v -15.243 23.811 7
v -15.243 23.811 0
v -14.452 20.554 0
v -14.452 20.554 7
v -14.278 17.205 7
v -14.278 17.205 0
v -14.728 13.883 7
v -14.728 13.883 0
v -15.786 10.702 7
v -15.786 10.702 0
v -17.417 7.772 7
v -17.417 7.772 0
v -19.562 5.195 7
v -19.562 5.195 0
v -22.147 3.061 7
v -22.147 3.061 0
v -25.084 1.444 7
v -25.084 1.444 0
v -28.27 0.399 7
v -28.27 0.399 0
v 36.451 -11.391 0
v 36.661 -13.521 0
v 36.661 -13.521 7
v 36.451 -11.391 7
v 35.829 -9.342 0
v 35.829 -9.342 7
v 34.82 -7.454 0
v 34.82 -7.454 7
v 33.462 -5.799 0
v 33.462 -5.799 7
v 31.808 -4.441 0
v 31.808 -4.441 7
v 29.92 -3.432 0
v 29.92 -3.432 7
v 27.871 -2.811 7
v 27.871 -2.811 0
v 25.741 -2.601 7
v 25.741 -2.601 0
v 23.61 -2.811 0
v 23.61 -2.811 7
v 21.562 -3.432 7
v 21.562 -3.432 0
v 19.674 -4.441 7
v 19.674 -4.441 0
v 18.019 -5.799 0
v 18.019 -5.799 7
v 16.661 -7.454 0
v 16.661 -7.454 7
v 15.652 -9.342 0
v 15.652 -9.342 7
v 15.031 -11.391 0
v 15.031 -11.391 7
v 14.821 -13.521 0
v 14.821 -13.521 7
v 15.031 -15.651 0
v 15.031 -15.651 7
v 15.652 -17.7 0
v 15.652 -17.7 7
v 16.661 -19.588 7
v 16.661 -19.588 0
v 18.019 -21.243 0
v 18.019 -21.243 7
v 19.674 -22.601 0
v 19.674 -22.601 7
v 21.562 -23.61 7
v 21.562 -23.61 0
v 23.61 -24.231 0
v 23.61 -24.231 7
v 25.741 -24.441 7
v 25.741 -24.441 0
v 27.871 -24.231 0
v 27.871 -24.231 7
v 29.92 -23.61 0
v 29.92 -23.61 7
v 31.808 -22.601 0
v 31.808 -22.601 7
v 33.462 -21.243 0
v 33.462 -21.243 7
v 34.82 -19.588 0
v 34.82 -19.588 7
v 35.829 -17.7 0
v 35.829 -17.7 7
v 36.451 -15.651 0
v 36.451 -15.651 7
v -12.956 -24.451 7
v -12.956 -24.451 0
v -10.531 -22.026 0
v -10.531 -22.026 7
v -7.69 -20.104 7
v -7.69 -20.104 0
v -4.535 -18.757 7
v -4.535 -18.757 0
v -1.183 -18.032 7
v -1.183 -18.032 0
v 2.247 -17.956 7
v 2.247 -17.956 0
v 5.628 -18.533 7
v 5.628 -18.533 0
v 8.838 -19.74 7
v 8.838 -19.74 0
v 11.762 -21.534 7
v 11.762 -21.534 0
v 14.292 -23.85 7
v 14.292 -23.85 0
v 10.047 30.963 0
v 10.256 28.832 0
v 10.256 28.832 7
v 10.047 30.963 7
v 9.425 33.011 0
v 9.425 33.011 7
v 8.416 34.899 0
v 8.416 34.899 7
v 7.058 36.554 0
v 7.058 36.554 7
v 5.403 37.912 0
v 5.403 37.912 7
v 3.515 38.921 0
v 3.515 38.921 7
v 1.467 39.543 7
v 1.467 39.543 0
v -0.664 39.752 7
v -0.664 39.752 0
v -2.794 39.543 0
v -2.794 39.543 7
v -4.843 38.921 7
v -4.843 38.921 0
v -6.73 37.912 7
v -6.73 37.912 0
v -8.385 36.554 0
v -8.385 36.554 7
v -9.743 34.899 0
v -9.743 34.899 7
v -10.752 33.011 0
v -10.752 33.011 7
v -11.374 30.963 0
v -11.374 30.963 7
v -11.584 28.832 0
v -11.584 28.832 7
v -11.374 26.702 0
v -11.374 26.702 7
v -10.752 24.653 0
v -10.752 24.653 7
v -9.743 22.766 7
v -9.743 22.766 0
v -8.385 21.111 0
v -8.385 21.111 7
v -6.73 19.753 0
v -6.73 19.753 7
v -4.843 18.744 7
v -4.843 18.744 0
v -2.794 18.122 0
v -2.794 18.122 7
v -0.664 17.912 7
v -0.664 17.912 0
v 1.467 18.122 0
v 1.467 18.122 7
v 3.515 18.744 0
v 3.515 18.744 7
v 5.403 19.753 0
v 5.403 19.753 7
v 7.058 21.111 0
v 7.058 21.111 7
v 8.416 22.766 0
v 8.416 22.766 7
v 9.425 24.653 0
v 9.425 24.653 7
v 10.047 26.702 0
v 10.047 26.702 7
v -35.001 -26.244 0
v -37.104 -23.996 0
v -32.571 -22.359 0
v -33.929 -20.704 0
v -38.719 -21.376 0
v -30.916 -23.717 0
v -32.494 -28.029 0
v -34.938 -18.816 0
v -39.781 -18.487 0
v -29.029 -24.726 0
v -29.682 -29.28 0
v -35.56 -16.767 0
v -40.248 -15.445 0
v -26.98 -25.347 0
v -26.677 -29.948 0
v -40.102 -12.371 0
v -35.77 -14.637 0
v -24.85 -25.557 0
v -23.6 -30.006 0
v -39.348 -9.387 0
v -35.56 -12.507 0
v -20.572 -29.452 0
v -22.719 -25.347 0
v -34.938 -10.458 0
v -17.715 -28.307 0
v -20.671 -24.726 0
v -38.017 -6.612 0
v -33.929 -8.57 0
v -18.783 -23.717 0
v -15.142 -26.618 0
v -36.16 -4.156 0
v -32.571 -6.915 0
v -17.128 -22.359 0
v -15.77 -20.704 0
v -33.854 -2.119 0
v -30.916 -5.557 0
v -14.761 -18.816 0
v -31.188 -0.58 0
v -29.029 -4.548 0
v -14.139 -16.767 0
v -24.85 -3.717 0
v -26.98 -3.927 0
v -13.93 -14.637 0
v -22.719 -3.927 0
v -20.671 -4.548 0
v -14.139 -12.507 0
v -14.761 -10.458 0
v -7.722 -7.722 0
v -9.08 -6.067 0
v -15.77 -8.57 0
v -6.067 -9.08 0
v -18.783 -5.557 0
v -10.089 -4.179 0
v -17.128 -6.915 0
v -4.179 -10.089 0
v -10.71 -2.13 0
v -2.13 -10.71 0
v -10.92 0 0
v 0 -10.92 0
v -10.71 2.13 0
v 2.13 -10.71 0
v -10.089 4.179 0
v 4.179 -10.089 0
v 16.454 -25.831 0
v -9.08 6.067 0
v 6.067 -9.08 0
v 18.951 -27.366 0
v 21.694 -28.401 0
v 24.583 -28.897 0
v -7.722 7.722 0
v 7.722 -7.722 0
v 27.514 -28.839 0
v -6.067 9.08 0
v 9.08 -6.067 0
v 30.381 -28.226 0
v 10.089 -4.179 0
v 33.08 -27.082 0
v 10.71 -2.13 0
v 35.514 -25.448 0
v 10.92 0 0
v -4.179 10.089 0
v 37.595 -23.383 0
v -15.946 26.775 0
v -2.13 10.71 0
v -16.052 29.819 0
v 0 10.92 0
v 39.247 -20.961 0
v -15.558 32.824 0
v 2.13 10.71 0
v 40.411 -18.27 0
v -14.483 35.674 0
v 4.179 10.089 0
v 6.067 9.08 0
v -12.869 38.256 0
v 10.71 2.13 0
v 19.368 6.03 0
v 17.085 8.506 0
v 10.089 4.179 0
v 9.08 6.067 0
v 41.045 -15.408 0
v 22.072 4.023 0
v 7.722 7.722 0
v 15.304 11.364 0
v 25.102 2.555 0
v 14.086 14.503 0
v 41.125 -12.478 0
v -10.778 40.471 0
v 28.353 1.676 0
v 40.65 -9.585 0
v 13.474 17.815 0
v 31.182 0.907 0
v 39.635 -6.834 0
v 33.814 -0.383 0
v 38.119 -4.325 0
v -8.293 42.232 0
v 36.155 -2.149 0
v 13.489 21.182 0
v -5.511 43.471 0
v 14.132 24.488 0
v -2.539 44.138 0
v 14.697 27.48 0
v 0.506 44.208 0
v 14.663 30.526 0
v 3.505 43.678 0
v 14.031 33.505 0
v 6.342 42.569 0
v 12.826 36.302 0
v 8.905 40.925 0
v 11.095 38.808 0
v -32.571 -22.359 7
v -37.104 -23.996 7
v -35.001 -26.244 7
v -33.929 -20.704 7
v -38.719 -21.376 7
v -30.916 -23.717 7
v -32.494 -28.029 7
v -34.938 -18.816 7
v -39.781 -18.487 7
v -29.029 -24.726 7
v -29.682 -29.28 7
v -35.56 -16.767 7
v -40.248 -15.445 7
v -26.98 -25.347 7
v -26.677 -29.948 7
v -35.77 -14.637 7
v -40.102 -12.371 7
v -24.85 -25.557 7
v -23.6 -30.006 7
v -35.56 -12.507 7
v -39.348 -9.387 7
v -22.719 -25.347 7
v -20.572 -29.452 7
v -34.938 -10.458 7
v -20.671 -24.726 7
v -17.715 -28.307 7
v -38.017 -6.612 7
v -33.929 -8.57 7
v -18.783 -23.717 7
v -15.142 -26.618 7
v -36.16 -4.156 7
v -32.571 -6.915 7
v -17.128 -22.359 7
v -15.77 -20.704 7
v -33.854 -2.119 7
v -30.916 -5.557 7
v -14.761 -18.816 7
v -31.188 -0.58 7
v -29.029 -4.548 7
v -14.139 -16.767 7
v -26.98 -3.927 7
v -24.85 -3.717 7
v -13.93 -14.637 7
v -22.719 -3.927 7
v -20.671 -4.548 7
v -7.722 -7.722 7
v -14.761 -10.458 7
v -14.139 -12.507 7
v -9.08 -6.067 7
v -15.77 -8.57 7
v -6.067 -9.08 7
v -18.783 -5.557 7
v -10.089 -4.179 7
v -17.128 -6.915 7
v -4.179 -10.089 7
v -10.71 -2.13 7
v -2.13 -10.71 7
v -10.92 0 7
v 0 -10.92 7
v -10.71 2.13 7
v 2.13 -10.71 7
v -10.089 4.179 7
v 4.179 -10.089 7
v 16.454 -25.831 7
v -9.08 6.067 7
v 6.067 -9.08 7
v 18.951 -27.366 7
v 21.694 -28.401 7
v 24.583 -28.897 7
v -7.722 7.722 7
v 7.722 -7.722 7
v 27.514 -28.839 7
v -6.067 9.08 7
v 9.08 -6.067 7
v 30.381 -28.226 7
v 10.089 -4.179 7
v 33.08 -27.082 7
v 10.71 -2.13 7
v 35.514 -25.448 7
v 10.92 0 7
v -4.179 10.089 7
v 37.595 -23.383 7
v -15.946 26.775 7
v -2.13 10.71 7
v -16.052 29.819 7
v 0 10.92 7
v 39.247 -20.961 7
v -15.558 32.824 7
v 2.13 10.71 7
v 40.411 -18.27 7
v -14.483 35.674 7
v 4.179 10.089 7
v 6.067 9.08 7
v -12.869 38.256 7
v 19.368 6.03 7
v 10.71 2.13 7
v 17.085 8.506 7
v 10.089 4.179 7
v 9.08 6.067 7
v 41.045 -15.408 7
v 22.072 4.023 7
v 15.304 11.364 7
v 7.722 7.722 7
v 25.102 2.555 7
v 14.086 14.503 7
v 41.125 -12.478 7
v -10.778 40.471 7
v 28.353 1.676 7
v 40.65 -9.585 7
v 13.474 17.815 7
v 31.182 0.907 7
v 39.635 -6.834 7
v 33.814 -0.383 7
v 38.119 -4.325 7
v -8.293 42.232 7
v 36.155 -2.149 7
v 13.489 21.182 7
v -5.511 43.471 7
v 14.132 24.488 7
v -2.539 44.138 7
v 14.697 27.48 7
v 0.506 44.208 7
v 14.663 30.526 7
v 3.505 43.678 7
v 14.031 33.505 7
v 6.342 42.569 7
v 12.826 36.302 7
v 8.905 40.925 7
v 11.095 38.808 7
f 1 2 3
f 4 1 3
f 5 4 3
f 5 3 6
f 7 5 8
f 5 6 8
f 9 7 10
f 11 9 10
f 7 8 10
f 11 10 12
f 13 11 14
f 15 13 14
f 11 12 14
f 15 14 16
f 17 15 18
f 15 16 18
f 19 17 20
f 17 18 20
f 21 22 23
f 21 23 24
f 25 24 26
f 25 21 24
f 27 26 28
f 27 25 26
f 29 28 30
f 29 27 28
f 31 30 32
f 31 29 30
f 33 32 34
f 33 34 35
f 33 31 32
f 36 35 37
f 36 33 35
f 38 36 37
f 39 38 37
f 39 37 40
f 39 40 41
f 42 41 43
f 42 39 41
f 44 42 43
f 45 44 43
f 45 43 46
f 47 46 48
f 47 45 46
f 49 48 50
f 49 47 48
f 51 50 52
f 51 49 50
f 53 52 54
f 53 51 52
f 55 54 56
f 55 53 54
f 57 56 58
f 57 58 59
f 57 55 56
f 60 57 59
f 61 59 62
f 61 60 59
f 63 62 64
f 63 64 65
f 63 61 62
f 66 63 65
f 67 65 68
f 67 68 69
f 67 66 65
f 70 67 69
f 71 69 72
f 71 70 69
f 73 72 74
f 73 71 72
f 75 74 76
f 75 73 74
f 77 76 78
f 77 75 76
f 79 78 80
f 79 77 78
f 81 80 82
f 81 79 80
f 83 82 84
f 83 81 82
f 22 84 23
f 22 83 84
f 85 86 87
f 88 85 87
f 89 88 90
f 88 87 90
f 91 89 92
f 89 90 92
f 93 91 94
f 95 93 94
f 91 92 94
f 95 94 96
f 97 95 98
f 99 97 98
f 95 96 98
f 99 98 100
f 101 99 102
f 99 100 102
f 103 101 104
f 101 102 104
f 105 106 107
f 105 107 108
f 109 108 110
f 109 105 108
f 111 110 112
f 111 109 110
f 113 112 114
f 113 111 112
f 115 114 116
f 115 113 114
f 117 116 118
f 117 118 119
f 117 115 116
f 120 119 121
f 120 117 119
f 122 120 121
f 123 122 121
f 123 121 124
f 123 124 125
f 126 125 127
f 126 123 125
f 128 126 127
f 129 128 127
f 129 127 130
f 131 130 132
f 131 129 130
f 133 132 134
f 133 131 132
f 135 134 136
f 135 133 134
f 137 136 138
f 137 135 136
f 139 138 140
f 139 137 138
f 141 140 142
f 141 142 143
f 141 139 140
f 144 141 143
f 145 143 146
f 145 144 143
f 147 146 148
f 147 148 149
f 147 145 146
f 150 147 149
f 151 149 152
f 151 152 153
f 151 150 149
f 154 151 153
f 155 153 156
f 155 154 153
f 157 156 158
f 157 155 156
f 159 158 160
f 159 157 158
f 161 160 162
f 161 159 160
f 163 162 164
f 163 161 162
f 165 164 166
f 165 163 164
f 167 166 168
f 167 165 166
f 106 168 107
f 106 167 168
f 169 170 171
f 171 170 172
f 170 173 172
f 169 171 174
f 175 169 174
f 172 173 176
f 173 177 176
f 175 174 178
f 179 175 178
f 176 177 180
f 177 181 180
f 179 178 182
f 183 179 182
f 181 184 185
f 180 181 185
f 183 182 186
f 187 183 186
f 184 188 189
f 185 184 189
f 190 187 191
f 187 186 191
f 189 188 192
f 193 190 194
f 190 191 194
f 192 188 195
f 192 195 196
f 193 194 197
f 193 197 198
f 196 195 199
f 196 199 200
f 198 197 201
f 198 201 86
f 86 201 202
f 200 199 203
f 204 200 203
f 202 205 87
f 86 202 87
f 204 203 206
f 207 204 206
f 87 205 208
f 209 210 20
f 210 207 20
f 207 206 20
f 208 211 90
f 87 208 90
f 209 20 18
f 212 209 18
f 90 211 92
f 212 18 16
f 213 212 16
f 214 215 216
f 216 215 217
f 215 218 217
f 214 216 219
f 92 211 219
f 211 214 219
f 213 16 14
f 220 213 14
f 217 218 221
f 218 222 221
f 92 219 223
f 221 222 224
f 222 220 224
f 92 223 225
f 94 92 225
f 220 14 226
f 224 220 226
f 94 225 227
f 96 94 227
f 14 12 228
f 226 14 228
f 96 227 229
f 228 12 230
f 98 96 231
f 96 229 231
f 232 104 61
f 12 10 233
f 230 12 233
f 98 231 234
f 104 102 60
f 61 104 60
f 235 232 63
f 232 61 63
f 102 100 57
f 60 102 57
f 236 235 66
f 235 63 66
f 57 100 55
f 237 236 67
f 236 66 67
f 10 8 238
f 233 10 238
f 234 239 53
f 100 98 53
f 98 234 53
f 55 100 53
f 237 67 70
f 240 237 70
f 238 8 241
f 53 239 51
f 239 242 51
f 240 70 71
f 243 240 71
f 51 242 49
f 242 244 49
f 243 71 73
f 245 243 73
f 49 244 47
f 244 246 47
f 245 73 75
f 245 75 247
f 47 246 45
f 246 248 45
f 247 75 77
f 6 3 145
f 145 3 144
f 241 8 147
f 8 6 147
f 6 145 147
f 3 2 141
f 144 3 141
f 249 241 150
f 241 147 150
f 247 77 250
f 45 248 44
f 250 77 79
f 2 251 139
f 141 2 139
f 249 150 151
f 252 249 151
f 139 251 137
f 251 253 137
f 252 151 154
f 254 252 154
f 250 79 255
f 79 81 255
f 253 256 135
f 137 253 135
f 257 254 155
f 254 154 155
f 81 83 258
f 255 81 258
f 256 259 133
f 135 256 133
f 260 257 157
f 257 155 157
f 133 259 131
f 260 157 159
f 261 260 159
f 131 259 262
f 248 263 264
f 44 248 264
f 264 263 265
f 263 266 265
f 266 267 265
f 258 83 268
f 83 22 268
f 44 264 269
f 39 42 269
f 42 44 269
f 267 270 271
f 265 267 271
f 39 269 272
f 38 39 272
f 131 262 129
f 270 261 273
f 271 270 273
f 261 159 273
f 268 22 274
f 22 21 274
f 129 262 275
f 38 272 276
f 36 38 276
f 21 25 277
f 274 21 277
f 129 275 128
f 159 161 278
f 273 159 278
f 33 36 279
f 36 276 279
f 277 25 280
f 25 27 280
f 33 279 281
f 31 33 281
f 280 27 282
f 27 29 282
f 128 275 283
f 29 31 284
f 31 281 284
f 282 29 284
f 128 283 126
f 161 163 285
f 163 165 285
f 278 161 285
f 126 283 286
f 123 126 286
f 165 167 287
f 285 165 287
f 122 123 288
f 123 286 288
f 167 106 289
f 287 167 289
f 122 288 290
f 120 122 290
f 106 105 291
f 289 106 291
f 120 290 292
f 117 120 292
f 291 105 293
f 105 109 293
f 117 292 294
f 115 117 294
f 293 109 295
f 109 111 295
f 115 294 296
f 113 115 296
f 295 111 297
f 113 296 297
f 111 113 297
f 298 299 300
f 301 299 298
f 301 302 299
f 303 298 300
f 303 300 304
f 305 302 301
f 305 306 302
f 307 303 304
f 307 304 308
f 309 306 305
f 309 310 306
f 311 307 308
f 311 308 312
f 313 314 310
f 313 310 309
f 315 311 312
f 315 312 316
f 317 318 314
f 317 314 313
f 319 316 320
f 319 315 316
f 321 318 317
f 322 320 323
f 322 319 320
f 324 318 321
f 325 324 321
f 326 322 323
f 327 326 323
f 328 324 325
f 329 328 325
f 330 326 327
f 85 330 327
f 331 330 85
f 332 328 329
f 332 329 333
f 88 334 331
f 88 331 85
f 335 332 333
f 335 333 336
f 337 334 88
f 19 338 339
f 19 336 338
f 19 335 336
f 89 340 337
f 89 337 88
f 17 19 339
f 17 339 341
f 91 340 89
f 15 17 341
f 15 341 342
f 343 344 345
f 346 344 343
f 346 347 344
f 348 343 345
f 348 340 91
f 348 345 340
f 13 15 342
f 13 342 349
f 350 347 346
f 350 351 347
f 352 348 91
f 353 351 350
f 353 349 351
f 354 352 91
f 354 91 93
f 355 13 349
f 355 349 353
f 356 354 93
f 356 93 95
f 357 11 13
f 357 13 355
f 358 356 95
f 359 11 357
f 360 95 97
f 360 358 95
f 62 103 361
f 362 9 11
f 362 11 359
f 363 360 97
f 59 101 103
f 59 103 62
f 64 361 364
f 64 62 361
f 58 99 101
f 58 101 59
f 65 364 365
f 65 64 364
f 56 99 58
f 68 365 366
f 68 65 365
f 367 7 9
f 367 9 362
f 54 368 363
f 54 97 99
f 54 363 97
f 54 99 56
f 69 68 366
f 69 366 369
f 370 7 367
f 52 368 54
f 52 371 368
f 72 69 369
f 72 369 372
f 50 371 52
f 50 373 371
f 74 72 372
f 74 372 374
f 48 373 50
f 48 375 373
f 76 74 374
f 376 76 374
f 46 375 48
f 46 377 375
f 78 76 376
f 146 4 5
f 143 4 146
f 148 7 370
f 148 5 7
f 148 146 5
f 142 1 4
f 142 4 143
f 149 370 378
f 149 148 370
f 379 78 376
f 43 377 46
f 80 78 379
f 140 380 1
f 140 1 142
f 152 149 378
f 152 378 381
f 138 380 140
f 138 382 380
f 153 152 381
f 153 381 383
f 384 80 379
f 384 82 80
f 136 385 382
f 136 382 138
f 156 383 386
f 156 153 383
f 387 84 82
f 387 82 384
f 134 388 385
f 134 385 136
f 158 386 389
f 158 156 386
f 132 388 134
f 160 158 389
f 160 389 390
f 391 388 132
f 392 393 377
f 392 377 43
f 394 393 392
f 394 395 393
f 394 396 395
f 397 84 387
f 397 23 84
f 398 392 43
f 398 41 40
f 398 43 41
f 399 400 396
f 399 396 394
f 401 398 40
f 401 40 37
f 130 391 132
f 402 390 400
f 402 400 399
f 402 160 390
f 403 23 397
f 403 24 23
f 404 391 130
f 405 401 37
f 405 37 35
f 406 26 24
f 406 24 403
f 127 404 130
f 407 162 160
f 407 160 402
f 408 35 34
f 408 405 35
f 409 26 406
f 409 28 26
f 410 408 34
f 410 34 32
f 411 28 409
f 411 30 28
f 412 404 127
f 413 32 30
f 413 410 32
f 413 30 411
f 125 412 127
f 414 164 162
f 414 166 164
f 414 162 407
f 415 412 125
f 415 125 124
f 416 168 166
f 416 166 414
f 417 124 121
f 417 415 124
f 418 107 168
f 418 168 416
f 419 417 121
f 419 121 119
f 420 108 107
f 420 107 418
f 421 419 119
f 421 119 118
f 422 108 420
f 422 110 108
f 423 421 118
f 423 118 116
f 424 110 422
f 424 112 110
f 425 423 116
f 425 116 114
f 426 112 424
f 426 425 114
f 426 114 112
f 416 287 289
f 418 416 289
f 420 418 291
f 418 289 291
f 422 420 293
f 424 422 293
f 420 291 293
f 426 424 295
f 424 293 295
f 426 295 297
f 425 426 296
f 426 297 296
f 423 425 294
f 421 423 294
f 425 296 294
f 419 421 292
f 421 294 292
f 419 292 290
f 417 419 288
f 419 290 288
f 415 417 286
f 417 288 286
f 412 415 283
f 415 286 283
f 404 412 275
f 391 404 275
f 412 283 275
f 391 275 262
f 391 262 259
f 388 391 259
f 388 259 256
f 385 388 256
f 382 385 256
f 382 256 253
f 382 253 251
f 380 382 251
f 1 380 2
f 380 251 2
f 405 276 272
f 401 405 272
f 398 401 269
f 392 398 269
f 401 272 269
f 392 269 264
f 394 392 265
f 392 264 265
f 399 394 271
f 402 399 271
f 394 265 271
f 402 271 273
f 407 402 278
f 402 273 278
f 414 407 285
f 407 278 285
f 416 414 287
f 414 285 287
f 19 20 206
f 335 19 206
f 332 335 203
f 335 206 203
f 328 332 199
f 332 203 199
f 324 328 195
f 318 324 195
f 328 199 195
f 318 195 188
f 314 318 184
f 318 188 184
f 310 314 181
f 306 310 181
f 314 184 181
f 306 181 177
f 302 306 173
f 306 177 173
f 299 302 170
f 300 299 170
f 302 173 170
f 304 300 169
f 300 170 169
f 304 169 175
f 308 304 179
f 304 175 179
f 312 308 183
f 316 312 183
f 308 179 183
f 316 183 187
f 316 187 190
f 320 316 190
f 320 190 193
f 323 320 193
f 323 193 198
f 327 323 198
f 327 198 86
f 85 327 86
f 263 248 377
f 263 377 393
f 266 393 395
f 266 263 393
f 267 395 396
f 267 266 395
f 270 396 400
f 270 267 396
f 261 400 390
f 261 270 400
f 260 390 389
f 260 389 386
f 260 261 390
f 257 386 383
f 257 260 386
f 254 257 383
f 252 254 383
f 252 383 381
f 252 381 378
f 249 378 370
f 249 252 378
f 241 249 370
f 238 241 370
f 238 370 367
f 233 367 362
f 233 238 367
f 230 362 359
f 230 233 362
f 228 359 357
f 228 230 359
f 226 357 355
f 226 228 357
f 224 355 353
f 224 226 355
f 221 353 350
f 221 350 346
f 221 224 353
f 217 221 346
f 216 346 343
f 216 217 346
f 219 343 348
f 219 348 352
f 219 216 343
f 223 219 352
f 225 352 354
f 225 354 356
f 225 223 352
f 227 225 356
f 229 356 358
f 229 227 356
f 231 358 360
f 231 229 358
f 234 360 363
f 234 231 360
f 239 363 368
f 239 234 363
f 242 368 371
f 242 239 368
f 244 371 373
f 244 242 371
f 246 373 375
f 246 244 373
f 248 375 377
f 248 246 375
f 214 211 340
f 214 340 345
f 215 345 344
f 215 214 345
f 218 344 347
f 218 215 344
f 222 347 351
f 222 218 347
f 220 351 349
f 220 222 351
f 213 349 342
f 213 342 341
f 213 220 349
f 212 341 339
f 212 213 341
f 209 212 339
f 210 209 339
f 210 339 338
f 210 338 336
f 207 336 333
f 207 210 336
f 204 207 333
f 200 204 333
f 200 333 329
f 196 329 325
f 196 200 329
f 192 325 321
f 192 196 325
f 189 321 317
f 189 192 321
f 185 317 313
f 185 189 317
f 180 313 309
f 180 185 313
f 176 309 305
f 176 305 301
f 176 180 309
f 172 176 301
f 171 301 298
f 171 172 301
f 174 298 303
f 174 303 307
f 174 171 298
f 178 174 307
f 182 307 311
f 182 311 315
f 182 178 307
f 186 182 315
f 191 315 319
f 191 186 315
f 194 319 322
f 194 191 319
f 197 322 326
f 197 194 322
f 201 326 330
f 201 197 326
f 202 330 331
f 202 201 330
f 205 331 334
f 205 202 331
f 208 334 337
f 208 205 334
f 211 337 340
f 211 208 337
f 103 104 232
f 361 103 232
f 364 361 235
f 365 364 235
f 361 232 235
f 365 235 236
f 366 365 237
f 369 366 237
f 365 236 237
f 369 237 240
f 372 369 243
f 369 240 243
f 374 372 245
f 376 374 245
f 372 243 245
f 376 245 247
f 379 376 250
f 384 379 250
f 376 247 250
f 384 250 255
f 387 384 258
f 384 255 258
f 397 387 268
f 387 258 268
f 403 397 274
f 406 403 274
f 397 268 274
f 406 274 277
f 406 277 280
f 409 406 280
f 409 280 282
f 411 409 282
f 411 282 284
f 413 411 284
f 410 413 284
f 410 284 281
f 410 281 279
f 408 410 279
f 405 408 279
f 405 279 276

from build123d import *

# Parameters (mm, degrees)
F0_R     = 10.92
F1_DEPTH = 7


# Not quite as in the source:
# - a feature names something its author has since deleted; it is built from what else it names


with BuildPart() as f1:
    # F0 (on Top) → F1 (new body)
    with BuildSketch(Plane.XY):
        with BuildLine():
            ThreePointArc((28.3529823071, 1.6761283467), (16.1276038689, 9.8932258121), (14.1316130419, 24.4876284834))
            ThreePointArc((14.1316130419, 24.4876284834), (-1.0184797386, 44.2482801815), (-15.2433325814, 23.8114940253))
            ThreePointArc((-15.2433325814, 23.8114940253), (-16.5331807129, 9.1989312159), (-28.2699008548, 0.3989255129))
            ThreePointArc((-28.2699008548, 0.3989255129), (-37.9772339165, -22.7266382845), (-12.9562617696, -24.4514481107))
            ThreePointArc((-12.9562617696, -24.4514481107), (0.5300904983, -17.9124126397), (14.291675769, -23.8503797349))
            ThreePointArc((14.291675769, -23.8503797349), (39.2470886778, -20.9610002997), (28.3529823071, 1.6761283467))
        make_face()
        with Locations((-24.849640726, -14.6369722206)):
            Circle(F0_R, mode=Mode.SUBTRACT)
        Circle(F0_R, mode=Mode.SUBTRACT)
        with Locations((25.7406966372, -13.5209886029)):
            Circle(F0_R, mode=Mode.SUBTRACT)
        with Locations((-0.6636456317, 28.8323633176)):
            Circle(F0_R, mode=Mode.SUBTRACT)
    extrude(amount=F1_DEPTH)


solid = f1.part
